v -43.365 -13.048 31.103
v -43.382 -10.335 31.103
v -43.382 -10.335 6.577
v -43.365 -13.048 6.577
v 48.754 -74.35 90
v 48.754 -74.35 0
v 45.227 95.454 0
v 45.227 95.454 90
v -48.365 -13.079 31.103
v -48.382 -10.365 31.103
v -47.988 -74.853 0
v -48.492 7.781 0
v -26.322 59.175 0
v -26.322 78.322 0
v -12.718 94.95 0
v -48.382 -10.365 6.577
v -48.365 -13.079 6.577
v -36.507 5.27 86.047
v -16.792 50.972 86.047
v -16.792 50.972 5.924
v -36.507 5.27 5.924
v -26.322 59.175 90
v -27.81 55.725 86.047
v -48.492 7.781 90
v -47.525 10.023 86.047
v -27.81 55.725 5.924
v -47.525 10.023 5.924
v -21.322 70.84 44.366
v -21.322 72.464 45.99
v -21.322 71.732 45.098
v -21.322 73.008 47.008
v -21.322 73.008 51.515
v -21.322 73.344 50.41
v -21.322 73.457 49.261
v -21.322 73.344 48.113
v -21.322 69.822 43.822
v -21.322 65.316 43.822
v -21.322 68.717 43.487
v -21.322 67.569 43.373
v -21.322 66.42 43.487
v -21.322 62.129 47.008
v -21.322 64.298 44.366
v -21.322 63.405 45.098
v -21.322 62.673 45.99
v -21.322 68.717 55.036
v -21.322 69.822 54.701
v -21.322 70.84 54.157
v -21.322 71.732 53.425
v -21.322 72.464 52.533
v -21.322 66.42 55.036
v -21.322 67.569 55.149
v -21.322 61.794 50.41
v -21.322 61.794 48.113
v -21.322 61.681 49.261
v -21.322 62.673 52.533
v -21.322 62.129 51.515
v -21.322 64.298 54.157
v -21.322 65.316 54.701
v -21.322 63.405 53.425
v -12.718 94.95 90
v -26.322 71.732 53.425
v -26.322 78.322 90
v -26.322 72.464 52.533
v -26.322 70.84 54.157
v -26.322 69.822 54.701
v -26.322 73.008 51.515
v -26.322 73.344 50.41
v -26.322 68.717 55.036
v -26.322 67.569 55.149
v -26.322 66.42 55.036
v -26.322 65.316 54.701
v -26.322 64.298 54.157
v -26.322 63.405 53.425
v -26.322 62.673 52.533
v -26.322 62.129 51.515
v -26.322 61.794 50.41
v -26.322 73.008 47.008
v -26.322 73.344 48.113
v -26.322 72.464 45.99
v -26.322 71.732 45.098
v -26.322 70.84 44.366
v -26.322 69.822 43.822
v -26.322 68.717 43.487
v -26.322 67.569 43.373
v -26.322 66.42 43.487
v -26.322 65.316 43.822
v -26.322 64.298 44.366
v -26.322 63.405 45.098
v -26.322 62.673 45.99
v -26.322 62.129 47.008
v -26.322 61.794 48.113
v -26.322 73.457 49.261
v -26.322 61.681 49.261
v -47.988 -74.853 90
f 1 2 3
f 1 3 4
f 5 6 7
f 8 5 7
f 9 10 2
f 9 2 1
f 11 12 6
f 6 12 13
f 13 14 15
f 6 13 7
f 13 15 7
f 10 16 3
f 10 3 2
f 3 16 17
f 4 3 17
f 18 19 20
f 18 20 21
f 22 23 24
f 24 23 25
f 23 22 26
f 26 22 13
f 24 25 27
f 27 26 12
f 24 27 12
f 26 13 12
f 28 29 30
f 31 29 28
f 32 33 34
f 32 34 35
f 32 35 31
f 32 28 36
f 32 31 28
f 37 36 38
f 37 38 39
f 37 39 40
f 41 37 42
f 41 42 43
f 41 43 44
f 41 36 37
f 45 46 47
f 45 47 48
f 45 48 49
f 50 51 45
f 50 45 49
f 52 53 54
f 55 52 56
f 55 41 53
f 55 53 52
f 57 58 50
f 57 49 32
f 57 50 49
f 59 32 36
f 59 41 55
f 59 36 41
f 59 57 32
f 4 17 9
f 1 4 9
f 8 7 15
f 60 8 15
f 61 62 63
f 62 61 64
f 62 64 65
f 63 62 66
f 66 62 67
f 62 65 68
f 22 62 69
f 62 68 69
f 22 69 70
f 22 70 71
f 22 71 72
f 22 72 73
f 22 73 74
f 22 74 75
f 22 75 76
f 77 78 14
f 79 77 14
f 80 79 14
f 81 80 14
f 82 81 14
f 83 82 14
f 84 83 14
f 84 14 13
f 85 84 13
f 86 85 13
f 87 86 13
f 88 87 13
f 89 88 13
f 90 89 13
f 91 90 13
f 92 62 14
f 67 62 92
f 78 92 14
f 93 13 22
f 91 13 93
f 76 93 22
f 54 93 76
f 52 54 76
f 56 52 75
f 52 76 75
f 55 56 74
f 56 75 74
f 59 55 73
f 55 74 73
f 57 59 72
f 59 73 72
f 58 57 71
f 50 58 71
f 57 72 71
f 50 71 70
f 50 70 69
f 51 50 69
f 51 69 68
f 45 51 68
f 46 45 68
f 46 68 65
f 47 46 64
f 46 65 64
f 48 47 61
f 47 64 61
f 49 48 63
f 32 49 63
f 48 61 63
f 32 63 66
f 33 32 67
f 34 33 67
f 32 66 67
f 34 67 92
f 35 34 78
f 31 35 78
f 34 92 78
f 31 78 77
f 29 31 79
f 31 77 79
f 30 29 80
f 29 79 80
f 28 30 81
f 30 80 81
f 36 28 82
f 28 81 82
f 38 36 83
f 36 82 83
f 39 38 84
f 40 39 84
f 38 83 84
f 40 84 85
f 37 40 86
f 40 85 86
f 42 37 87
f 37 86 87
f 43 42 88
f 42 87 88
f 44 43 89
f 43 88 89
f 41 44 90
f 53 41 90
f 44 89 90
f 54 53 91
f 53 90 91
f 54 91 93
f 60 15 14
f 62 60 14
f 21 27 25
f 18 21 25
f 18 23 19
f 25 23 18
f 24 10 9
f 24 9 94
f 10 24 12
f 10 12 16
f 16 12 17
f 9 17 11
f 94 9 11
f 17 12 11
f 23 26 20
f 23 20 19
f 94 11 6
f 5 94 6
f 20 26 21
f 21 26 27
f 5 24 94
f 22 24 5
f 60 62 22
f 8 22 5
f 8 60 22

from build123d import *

# Parameters (mm, degrees)
PAD_DEPTH       = 90
SKETCH001_W     = 49.773563
SKETCH001_H     = 80.123774
POCKET_DEPTH    = 12
SKETCH002_R     = 5.887963
POCKET001_DEPTH = 5
SKETCH003_W     = 2.713595
SKETCH003_H     = 24.526356
POCKET002_DEPTH = 5


with BuildPart() as part:
    # Sketch → Pad (new body)
    with BuildSketch(Plane.XY):
        Polygon((-48.492157, 7.780759), (-47.988304, -74.853439), (48.754147, -74.349571), (45.227108, 95.453613), (-12.717616, 94.949745), (-26.322012, 78.322136), (-26.322012, 59.175186), align=None)
    extrude(amount=PAD_DEPTH)

    # Sketch001 (on Face7 of Pad) → Pocket (cut)
    with BuildSketch(Plane(origin=(-43.714137, 18.857079, 0), x_dir=(-0.396091, -0.918211, 0), z_dir=(-0.918211, 0.396091, 0))):
        with Locations((-15.26545, 45.985601)):
            Rectangle(SKETCH001_W, SKETCH001_H)
    extrude(amount=-POCKET_DEPTH, mode=Mode.SUBTRACT)

    # Sketch002 (on Face6 of Pocket) → Pocket001 (cut)
    with BuildSketch(Plane(origin=(-26.322012, 0, 0), x_dir=(0, -1, 0), z_dir=(-1, 0, 0))):
        with Locations((-67.568731, 49.26139)):
            Circle(SKETCH002_R)
    extrude(amount=-POCKET001_DEPTH, mode=Mode.SUBTRACT)

    # Sketch003 (on Face1 of Pocket001) → Pocket002 (cut)
    with BuildSketch(Plane(origin=(-48.442914, -0.295375, 0), x_dir=(0.006097, -0.999981, 0), z_dir=(-0.999981, -0.006097, 0))):
        with Locations((11.426969, 18.839719)):
            Rectangle(SKETCH003_W, SKETCH003_H)
    extrude(amount=-POCKET002_DEPTH, mode=Mode.SUBTRACT)


solid = part.part
